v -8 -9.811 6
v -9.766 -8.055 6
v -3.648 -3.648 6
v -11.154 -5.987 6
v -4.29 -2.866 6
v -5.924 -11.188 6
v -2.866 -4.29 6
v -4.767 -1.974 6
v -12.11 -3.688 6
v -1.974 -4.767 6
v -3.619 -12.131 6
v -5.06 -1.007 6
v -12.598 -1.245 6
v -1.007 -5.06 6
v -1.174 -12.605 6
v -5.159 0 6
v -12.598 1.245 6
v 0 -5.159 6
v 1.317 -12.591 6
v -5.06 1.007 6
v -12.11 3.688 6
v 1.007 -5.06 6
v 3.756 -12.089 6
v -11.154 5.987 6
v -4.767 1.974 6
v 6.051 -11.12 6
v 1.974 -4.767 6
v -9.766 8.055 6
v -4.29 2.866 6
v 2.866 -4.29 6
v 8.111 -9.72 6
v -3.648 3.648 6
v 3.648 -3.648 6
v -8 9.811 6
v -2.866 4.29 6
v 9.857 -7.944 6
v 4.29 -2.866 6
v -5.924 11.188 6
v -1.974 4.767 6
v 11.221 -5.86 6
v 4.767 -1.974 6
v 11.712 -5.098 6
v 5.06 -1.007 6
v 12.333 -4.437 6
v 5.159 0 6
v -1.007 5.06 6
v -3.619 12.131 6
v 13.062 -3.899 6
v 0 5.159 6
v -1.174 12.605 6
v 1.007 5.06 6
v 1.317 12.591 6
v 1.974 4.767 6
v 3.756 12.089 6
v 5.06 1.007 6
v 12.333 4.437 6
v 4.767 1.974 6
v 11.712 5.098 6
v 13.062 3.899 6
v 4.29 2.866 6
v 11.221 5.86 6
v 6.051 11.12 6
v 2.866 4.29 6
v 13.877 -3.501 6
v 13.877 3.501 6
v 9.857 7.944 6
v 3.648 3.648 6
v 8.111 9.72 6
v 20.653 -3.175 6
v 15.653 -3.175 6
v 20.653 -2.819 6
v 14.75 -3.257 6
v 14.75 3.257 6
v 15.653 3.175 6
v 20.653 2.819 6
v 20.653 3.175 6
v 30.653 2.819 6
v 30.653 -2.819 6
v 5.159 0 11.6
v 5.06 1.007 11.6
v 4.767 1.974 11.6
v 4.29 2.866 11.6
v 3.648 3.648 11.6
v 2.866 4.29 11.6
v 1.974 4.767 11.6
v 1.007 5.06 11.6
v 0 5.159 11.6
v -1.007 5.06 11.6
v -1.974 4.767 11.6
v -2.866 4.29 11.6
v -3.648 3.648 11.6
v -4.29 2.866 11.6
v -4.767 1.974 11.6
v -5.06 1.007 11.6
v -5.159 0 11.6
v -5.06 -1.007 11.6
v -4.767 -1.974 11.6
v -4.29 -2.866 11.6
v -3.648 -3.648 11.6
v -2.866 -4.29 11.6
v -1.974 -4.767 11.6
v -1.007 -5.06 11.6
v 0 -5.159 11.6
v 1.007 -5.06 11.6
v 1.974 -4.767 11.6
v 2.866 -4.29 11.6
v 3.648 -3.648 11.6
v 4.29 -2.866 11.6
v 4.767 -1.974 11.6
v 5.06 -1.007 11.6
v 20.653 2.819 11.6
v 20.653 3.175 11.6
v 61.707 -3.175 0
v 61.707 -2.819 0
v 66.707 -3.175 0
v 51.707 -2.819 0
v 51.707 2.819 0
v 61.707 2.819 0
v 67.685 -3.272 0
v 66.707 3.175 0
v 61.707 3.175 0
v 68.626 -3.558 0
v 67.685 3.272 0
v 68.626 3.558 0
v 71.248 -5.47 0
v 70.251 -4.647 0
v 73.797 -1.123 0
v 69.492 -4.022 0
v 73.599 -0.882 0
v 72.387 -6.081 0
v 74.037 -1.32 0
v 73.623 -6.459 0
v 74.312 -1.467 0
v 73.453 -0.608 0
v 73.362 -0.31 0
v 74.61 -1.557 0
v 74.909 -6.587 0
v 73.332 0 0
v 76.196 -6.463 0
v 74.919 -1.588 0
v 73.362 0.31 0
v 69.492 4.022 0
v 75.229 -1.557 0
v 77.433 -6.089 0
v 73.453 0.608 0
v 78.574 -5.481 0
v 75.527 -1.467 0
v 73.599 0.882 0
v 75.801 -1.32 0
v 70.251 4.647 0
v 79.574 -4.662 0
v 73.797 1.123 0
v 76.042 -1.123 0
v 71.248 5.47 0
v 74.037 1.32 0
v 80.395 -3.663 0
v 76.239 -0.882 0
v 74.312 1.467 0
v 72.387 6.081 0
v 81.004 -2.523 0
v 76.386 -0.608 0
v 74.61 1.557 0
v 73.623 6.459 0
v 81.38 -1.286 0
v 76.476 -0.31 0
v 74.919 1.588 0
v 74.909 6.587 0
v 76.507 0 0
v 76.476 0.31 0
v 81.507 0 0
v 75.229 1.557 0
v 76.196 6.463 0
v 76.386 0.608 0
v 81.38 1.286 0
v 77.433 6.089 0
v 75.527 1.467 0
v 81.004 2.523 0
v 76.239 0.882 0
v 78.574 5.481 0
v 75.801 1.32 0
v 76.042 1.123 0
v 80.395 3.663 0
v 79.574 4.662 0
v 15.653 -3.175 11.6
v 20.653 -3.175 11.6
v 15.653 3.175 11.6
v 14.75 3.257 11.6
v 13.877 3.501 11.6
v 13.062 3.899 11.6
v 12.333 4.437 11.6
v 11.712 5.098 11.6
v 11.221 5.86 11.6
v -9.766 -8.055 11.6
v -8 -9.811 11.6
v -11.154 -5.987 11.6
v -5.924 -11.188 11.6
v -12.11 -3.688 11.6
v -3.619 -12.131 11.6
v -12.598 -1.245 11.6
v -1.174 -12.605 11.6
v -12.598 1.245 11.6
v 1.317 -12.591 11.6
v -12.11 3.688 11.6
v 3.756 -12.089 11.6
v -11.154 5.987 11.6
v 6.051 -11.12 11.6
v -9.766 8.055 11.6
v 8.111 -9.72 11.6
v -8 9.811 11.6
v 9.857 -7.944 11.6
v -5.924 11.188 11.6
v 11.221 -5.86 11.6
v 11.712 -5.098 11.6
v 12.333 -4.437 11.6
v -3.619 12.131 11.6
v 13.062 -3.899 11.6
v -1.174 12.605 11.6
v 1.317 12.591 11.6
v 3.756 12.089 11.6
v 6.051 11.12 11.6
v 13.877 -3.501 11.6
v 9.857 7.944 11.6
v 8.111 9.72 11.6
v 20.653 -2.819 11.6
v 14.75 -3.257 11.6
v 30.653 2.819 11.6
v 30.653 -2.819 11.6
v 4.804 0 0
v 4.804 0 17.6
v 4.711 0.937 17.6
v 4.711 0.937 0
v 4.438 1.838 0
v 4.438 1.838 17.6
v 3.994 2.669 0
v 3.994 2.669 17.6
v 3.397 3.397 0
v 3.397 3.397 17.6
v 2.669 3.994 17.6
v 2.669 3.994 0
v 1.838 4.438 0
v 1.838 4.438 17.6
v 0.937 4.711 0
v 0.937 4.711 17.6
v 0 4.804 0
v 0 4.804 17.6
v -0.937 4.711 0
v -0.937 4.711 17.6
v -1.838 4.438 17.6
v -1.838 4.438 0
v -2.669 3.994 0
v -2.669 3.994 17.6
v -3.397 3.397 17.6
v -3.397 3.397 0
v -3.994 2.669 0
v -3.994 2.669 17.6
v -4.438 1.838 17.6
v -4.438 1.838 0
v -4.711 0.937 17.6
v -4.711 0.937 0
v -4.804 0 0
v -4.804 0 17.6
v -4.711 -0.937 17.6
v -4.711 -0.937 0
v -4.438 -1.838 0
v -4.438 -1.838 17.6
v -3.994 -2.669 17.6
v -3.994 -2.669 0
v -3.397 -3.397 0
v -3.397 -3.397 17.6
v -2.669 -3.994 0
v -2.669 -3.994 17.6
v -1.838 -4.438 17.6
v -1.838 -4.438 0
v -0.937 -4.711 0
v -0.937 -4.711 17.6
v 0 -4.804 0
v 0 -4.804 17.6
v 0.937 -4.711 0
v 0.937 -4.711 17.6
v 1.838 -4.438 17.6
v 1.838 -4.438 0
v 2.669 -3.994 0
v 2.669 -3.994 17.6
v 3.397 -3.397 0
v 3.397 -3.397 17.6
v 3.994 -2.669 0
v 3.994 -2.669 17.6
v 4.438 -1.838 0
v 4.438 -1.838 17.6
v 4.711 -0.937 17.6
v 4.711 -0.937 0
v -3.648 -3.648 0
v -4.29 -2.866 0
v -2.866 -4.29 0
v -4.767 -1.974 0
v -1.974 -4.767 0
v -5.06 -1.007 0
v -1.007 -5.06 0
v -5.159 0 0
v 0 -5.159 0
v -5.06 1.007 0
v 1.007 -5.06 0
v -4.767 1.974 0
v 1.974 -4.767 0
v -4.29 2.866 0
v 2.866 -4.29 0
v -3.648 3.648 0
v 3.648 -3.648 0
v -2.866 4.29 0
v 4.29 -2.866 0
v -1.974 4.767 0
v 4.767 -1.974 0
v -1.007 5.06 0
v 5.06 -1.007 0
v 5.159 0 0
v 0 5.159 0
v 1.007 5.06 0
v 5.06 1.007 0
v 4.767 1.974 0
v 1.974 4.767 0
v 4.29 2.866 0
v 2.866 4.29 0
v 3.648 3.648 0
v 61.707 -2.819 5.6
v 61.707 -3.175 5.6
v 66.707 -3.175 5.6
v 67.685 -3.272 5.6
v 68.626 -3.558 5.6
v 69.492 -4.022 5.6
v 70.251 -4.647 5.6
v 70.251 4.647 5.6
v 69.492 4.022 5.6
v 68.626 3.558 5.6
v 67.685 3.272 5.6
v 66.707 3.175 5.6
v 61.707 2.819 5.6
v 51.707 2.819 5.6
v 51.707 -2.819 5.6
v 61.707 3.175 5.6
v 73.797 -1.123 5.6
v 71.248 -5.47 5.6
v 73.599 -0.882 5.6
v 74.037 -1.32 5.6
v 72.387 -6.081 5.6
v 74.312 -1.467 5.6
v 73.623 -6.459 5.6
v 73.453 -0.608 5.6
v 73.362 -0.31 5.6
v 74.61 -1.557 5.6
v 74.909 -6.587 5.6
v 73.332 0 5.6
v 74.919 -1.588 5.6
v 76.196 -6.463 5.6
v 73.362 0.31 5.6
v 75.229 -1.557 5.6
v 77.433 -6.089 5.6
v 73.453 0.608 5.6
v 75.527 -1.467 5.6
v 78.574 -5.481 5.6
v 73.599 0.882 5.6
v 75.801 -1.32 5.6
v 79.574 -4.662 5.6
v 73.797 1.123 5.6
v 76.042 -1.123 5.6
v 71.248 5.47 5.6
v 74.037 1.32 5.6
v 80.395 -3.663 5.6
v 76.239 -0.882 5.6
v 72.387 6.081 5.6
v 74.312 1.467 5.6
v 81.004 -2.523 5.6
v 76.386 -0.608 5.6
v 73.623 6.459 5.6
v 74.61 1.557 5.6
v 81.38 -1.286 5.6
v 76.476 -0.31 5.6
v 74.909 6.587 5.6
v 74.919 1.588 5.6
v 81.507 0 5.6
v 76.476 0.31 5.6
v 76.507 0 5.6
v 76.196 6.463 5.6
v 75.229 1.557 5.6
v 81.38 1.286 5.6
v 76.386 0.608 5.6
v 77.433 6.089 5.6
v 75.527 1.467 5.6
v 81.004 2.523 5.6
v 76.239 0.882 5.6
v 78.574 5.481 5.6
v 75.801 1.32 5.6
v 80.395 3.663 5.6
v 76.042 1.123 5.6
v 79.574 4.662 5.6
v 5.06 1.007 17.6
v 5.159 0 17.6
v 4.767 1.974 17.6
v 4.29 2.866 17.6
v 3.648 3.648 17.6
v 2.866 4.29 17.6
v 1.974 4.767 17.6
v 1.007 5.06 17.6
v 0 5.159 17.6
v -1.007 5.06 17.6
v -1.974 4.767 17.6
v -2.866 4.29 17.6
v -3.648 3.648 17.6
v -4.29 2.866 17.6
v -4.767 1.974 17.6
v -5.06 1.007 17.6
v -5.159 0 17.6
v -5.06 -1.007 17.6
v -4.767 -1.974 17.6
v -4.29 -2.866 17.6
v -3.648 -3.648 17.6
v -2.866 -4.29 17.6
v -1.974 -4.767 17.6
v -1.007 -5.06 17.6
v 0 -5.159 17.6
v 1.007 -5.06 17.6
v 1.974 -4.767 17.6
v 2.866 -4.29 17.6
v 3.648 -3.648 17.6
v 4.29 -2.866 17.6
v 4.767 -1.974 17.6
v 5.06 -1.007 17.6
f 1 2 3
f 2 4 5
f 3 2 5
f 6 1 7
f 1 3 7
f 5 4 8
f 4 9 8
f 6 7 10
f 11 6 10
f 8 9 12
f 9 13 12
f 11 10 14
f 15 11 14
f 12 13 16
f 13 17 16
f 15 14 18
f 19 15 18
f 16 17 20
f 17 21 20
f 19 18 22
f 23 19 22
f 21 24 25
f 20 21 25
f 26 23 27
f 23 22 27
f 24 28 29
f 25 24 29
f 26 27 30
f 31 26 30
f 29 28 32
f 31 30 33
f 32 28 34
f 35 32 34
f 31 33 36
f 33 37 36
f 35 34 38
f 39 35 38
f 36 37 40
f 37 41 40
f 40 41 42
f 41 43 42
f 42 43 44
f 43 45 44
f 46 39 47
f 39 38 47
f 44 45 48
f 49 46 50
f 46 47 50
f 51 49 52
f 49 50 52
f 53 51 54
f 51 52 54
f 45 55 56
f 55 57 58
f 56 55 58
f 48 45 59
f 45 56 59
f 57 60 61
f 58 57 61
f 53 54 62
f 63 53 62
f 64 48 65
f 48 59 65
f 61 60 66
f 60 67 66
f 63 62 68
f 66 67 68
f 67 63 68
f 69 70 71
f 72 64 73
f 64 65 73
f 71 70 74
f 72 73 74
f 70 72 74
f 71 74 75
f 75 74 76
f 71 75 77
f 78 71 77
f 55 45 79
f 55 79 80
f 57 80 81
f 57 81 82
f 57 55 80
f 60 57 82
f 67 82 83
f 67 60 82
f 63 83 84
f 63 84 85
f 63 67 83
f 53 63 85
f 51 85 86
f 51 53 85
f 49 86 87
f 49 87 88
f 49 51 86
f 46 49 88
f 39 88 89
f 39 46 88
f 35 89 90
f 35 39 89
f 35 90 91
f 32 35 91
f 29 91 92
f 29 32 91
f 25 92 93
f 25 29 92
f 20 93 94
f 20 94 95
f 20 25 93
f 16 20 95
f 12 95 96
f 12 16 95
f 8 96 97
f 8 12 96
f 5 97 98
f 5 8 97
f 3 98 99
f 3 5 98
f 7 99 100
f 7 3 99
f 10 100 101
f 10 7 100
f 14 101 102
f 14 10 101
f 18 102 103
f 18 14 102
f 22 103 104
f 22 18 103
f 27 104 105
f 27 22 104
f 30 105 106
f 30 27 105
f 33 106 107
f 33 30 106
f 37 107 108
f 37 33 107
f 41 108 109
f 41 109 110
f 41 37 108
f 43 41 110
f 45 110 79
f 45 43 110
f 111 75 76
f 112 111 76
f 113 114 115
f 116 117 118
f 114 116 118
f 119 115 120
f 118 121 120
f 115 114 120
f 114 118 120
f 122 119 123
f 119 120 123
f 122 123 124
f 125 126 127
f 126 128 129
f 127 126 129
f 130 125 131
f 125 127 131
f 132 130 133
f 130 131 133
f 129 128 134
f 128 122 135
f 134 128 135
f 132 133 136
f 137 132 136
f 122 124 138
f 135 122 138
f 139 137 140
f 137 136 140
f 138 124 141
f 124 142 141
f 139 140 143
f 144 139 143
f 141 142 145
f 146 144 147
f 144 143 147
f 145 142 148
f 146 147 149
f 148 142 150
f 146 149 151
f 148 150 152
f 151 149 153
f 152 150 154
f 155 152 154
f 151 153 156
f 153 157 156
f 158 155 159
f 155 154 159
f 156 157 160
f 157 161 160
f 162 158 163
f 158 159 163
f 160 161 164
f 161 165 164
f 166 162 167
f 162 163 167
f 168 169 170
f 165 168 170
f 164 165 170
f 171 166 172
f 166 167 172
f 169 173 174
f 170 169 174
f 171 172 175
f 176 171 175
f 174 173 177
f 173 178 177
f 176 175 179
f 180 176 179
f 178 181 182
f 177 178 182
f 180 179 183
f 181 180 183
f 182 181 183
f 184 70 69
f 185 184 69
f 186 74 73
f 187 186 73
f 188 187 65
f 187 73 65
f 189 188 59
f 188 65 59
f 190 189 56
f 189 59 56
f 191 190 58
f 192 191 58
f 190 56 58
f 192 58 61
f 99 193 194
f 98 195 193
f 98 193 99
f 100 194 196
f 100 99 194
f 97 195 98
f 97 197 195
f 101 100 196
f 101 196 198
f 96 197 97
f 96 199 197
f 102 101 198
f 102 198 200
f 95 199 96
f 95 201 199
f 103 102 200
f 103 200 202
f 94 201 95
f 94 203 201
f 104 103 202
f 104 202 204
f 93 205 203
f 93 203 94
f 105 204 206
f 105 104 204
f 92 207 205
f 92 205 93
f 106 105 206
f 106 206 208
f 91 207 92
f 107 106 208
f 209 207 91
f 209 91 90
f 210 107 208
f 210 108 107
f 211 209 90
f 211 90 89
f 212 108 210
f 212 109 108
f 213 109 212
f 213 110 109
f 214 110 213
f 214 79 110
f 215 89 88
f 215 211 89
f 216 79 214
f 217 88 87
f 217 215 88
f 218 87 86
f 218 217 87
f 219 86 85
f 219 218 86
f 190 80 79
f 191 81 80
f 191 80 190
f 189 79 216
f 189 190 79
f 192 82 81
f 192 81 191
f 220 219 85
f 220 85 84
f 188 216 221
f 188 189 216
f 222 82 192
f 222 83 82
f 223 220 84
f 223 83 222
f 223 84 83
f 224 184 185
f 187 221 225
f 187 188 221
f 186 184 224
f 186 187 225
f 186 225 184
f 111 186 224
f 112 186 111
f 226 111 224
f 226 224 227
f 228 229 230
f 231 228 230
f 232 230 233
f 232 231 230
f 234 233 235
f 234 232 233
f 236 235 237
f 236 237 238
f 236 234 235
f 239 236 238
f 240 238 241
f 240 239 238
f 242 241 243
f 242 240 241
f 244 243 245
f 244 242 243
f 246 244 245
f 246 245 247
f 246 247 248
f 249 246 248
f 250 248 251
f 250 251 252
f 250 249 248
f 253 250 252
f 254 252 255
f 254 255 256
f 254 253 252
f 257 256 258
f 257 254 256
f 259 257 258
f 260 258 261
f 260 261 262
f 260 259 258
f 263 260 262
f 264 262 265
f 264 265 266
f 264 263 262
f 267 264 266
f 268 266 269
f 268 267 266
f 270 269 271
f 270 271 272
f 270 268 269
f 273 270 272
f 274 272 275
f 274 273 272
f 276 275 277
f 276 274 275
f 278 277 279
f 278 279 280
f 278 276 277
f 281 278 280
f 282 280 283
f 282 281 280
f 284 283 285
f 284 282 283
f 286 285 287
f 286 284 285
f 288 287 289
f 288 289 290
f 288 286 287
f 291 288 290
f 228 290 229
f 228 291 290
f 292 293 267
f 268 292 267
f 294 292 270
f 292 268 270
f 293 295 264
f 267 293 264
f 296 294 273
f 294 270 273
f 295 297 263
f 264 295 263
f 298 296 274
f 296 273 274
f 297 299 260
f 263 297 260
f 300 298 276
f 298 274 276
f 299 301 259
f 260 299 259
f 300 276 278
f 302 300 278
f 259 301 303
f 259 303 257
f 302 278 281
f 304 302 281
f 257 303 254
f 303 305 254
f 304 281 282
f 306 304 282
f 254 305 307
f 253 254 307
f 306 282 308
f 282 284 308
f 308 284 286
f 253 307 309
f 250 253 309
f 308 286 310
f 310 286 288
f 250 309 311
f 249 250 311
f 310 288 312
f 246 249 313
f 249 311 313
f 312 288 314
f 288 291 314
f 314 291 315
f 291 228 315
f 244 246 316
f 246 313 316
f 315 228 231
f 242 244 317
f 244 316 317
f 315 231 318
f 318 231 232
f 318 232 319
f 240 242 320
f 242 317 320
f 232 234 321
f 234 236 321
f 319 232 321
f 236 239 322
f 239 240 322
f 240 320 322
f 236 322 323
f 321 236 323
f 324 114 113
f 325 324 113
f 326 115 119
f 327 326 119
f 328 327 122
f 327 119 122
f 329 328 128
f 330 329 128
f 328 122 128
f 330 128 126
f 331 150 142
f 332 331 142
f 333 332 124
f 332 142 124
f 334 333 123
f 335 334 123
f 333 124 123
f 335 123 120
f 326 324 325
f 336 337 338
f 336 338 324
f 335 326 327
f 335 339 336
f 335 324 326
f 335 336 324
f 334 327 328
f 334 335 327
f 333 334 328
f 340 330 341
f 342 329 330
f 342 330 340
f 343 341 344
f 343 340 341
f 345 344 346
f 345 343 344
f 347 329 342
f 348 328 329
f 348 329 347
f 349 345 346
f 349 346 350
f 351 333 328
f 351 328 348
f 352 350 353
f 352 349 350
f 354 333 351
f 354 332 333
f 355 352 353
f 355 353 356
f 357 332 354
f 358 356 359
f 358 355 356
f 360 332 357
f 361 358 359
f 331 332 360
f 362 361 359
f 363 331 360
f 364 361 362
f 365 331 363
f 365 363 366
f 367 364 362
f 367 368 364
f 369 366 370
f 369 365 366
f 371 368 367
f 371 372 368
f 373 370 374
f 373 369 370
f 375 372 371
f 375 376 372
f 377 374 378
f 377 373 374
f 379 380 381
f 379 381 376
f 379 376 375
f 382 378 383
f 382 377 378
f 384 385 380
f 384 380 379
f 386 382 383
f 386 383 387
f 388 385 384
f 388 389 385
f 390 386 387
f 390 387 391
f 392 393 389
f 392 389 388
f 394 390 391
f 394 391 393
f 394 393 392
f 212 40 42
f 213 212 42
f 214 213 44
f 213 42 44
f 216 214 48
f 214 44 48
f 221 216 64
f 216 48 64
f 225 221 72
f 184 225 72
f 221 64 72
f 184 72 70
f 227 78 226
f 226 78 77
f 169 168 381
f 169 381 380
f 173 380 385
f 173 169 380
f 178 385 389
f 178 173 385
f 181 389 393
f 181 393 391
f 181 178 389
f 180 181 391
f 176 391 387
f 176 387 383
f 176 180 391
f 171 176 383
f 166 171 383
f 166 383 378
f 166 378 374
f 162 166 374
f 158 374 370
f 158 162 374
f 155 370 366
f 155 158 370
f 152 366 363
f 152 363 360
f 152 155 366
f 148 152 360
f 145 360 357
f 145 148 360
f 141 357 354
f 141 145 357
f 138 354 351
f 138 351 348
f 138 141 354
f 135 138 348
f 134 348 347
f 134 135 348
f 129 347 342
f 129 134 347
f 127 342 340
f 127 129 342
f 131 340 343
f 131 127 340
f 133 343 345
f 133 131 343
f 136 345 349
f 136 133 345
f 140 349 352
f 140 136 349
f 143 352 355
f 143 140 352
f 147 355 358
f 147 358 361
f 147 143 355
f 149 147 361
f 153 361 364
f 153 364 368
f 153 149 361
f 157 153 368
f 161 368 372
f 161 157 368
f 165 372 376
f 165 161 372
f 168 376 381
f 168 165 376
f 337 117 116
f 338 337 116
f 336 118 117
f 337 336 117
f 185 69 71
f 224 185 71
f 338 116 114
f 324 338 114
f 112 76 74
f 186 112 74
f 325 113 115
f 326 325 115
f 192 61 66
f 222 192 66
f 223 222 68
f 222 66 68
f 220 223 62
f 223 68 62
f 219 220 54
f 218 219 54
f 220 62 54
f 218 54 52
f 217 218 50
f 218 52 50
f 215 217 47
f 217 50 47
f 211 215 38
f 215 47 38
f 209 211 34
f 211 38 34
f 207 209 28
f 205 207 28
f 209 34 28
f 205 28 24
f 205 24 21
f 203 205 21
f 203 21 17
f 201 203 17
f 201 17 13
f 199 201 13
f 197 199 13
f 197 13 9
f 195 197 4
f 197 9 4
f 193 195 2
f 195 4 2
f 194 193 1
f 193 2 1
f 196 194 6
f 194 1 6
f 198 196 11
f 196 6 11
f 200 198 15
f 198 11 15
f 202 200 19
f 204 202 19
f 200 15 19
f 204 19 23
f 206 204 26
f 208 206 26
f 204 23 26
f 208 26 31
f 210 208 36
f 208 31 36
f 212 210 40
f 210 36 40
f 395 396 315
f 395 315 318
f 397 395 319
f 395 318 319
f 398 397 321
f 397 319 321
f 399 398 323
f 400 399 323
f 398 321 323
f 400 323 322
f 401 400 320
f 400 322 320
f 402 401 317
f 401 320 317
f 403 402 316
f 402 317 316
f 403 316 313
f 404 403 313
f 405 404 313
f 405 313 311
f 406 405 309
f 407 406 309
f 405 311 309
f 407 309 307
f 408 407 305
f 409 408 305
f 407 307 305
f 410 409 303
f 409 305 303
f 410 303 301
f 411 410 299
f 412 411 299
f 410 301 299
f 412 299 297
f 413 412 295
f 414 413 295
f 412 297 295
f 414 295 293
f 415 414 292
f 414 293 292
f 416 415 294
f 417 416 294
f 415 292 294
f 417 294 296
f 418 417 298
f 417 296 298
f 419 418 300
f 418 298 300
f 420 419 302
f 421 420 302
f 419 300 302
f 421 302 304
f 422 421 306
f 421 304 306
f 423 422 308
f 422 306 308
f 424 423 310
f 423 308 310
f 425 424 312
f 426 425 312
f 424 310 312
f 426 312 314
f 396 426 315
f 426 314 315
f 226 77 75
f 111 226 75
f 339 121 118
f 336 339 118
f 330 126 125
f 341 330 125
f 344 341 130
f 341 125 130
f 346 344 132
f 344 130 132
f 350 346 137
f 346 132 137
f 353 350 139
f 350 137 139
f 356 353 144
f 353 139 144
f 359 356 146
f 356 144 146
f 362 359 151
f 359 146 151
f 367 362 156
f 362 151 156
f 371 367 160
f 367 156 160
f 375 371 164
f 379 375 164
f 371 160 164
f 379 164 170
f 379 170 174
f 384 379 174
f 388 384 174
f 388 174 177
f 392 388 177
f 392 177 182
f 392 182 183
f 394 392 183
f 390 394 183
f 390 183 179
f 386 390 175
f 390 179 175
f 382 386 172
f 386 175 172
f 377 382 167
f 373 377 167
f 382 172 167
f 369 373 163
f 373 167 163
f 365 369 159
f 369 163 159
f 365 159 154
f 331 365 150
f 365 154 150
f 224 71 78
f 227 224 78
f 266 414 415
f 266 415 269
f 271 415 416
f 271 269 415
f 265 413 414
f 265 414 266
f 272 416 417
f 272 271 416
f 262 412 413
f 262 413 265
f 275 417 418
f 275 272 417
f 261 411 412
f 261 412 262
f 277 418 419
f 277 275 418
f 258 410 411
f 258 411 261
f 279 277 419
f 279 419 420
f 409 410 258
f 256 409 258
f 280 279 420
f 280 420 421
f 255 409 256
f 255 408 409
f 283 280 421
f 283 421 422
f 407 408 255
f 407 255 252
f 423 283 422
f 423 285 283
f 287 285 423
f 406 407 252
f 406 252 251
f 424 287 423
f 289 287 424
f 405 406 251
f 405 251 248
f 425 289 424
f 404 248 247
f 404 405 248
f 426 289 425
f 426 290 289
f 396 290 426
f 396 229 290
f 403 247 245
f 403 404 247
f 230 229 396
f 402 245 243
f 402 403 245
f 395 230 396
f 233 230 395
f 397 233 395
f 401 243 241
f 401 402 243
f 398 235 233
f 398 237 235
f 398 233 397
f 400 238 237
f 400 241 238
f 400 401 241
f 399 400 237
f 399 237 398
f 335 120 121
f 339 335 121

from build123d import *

# Parameters (mm, degrees)
F0_R     = 5.159375
F0_R_2   = 4.803775
F1_DEPTH = 17.6
F2_R     = 5.159375
F3_DEPTH = 5.6
F2_R_2   = 1.5875


with BuildPart() as f1:
    # F0 (on Top) → F1 (new body)
    with BuildSketch(Plane.XY):
        Circle(F0_R)
        Circle(F0_R_2, mode=Mode.SUBTRACT)
    extrude(amount=F1_DEPTH)


with BuildPart() as f3:
    # F2 (on Top) → F3 (new body)
    with BuildSketch(Plane.XY):
        with BuildLine():
            ThreePointArc((15.6532073516, 3.175), (13.0621817718, 3.8987181518), (11.2212250896, 5.860365422))
            ThreePointArc((11.2212250896, 5.860365422), (-12.659375, 0), (11.2212250896, -5.860365422))
            ThreePointArc((11.2212250896, -5.860365422), (13.0621817718, -3.8987181518), (15.6532073516, -3.175))
            Line((15.6532073516, -3.175), (20.6532073516, -3.175))
            Line((20.6532073516, -3.175), (20.6532073516, -2.8194))
            Line((20.6532073516, -2.8194), (30.6532073516, -2.8194))
            Line((30.6532073516, -2.8194), (30.6532073516, 2.8194))
            Line((30.6532073516, 2.8194), (20.6532073516, 2.8194))
            Line((20.6532073516, 2.8194), (20.6532073516, 3.175))
            Line((20.6532073516, 3.175), (15.6532073516, 3.175))
        make_face()
        Circle(F2_R, mode=Mode.SUBTRACT)
    extrude(amount=F3_DEPTH)


with BuildPart() as f3b:
    # F2 (on Top) → F3, piece 2 (new body)
    with BuildSketch(Plane.XY):
        with BuildLine():
            Line((61.7071763033, 2.8194), (51.7071763033, 2.8194))
            Line((51.7071763033, 2.8194), (51.7071763033, -2.8194))
            Line((51.7071763033, -2.8194), (61.7071763033, -2.8194))
            Line((61.7071763033, -2.8194), (61.7071763033, -3.175))
            Line((61.7071763033, -3.175), (66.7071763033, -3.175))
            ThreePointArc((66.7071763033, -3.175), (68.6258294177, -3.5577746182), (70.2507178468, -4.6474919094))
            ThreePointArc((70.2507178468, -4.6474919094), (81.5068338304, 0), (70.2507178468, 4.6474919094))
            ThreePointArc((70.2507178468, 4.6474919094), (68.6258294177, 3.5577746182), (66.7071763033, 3.175))
            Line((66.7071763033, 3.175), (61.7071763033, 3.175))
            Line((61.7071763033, 3.175), (61.7071763033, 2.8194))
        make_face()
        with Locations((74.9193338304, 0)):
            Circle(F2_R_2, mode=Mode.SUBTRACT)
    extrude(amount=F3_DEPTH)


with BuildPart() as f3_1:
    # F4: moved
    add(f3.part.moved(Location((0, 0, 6))))


solid = Compound([f1.part, f3b.part, f3_1.part])
